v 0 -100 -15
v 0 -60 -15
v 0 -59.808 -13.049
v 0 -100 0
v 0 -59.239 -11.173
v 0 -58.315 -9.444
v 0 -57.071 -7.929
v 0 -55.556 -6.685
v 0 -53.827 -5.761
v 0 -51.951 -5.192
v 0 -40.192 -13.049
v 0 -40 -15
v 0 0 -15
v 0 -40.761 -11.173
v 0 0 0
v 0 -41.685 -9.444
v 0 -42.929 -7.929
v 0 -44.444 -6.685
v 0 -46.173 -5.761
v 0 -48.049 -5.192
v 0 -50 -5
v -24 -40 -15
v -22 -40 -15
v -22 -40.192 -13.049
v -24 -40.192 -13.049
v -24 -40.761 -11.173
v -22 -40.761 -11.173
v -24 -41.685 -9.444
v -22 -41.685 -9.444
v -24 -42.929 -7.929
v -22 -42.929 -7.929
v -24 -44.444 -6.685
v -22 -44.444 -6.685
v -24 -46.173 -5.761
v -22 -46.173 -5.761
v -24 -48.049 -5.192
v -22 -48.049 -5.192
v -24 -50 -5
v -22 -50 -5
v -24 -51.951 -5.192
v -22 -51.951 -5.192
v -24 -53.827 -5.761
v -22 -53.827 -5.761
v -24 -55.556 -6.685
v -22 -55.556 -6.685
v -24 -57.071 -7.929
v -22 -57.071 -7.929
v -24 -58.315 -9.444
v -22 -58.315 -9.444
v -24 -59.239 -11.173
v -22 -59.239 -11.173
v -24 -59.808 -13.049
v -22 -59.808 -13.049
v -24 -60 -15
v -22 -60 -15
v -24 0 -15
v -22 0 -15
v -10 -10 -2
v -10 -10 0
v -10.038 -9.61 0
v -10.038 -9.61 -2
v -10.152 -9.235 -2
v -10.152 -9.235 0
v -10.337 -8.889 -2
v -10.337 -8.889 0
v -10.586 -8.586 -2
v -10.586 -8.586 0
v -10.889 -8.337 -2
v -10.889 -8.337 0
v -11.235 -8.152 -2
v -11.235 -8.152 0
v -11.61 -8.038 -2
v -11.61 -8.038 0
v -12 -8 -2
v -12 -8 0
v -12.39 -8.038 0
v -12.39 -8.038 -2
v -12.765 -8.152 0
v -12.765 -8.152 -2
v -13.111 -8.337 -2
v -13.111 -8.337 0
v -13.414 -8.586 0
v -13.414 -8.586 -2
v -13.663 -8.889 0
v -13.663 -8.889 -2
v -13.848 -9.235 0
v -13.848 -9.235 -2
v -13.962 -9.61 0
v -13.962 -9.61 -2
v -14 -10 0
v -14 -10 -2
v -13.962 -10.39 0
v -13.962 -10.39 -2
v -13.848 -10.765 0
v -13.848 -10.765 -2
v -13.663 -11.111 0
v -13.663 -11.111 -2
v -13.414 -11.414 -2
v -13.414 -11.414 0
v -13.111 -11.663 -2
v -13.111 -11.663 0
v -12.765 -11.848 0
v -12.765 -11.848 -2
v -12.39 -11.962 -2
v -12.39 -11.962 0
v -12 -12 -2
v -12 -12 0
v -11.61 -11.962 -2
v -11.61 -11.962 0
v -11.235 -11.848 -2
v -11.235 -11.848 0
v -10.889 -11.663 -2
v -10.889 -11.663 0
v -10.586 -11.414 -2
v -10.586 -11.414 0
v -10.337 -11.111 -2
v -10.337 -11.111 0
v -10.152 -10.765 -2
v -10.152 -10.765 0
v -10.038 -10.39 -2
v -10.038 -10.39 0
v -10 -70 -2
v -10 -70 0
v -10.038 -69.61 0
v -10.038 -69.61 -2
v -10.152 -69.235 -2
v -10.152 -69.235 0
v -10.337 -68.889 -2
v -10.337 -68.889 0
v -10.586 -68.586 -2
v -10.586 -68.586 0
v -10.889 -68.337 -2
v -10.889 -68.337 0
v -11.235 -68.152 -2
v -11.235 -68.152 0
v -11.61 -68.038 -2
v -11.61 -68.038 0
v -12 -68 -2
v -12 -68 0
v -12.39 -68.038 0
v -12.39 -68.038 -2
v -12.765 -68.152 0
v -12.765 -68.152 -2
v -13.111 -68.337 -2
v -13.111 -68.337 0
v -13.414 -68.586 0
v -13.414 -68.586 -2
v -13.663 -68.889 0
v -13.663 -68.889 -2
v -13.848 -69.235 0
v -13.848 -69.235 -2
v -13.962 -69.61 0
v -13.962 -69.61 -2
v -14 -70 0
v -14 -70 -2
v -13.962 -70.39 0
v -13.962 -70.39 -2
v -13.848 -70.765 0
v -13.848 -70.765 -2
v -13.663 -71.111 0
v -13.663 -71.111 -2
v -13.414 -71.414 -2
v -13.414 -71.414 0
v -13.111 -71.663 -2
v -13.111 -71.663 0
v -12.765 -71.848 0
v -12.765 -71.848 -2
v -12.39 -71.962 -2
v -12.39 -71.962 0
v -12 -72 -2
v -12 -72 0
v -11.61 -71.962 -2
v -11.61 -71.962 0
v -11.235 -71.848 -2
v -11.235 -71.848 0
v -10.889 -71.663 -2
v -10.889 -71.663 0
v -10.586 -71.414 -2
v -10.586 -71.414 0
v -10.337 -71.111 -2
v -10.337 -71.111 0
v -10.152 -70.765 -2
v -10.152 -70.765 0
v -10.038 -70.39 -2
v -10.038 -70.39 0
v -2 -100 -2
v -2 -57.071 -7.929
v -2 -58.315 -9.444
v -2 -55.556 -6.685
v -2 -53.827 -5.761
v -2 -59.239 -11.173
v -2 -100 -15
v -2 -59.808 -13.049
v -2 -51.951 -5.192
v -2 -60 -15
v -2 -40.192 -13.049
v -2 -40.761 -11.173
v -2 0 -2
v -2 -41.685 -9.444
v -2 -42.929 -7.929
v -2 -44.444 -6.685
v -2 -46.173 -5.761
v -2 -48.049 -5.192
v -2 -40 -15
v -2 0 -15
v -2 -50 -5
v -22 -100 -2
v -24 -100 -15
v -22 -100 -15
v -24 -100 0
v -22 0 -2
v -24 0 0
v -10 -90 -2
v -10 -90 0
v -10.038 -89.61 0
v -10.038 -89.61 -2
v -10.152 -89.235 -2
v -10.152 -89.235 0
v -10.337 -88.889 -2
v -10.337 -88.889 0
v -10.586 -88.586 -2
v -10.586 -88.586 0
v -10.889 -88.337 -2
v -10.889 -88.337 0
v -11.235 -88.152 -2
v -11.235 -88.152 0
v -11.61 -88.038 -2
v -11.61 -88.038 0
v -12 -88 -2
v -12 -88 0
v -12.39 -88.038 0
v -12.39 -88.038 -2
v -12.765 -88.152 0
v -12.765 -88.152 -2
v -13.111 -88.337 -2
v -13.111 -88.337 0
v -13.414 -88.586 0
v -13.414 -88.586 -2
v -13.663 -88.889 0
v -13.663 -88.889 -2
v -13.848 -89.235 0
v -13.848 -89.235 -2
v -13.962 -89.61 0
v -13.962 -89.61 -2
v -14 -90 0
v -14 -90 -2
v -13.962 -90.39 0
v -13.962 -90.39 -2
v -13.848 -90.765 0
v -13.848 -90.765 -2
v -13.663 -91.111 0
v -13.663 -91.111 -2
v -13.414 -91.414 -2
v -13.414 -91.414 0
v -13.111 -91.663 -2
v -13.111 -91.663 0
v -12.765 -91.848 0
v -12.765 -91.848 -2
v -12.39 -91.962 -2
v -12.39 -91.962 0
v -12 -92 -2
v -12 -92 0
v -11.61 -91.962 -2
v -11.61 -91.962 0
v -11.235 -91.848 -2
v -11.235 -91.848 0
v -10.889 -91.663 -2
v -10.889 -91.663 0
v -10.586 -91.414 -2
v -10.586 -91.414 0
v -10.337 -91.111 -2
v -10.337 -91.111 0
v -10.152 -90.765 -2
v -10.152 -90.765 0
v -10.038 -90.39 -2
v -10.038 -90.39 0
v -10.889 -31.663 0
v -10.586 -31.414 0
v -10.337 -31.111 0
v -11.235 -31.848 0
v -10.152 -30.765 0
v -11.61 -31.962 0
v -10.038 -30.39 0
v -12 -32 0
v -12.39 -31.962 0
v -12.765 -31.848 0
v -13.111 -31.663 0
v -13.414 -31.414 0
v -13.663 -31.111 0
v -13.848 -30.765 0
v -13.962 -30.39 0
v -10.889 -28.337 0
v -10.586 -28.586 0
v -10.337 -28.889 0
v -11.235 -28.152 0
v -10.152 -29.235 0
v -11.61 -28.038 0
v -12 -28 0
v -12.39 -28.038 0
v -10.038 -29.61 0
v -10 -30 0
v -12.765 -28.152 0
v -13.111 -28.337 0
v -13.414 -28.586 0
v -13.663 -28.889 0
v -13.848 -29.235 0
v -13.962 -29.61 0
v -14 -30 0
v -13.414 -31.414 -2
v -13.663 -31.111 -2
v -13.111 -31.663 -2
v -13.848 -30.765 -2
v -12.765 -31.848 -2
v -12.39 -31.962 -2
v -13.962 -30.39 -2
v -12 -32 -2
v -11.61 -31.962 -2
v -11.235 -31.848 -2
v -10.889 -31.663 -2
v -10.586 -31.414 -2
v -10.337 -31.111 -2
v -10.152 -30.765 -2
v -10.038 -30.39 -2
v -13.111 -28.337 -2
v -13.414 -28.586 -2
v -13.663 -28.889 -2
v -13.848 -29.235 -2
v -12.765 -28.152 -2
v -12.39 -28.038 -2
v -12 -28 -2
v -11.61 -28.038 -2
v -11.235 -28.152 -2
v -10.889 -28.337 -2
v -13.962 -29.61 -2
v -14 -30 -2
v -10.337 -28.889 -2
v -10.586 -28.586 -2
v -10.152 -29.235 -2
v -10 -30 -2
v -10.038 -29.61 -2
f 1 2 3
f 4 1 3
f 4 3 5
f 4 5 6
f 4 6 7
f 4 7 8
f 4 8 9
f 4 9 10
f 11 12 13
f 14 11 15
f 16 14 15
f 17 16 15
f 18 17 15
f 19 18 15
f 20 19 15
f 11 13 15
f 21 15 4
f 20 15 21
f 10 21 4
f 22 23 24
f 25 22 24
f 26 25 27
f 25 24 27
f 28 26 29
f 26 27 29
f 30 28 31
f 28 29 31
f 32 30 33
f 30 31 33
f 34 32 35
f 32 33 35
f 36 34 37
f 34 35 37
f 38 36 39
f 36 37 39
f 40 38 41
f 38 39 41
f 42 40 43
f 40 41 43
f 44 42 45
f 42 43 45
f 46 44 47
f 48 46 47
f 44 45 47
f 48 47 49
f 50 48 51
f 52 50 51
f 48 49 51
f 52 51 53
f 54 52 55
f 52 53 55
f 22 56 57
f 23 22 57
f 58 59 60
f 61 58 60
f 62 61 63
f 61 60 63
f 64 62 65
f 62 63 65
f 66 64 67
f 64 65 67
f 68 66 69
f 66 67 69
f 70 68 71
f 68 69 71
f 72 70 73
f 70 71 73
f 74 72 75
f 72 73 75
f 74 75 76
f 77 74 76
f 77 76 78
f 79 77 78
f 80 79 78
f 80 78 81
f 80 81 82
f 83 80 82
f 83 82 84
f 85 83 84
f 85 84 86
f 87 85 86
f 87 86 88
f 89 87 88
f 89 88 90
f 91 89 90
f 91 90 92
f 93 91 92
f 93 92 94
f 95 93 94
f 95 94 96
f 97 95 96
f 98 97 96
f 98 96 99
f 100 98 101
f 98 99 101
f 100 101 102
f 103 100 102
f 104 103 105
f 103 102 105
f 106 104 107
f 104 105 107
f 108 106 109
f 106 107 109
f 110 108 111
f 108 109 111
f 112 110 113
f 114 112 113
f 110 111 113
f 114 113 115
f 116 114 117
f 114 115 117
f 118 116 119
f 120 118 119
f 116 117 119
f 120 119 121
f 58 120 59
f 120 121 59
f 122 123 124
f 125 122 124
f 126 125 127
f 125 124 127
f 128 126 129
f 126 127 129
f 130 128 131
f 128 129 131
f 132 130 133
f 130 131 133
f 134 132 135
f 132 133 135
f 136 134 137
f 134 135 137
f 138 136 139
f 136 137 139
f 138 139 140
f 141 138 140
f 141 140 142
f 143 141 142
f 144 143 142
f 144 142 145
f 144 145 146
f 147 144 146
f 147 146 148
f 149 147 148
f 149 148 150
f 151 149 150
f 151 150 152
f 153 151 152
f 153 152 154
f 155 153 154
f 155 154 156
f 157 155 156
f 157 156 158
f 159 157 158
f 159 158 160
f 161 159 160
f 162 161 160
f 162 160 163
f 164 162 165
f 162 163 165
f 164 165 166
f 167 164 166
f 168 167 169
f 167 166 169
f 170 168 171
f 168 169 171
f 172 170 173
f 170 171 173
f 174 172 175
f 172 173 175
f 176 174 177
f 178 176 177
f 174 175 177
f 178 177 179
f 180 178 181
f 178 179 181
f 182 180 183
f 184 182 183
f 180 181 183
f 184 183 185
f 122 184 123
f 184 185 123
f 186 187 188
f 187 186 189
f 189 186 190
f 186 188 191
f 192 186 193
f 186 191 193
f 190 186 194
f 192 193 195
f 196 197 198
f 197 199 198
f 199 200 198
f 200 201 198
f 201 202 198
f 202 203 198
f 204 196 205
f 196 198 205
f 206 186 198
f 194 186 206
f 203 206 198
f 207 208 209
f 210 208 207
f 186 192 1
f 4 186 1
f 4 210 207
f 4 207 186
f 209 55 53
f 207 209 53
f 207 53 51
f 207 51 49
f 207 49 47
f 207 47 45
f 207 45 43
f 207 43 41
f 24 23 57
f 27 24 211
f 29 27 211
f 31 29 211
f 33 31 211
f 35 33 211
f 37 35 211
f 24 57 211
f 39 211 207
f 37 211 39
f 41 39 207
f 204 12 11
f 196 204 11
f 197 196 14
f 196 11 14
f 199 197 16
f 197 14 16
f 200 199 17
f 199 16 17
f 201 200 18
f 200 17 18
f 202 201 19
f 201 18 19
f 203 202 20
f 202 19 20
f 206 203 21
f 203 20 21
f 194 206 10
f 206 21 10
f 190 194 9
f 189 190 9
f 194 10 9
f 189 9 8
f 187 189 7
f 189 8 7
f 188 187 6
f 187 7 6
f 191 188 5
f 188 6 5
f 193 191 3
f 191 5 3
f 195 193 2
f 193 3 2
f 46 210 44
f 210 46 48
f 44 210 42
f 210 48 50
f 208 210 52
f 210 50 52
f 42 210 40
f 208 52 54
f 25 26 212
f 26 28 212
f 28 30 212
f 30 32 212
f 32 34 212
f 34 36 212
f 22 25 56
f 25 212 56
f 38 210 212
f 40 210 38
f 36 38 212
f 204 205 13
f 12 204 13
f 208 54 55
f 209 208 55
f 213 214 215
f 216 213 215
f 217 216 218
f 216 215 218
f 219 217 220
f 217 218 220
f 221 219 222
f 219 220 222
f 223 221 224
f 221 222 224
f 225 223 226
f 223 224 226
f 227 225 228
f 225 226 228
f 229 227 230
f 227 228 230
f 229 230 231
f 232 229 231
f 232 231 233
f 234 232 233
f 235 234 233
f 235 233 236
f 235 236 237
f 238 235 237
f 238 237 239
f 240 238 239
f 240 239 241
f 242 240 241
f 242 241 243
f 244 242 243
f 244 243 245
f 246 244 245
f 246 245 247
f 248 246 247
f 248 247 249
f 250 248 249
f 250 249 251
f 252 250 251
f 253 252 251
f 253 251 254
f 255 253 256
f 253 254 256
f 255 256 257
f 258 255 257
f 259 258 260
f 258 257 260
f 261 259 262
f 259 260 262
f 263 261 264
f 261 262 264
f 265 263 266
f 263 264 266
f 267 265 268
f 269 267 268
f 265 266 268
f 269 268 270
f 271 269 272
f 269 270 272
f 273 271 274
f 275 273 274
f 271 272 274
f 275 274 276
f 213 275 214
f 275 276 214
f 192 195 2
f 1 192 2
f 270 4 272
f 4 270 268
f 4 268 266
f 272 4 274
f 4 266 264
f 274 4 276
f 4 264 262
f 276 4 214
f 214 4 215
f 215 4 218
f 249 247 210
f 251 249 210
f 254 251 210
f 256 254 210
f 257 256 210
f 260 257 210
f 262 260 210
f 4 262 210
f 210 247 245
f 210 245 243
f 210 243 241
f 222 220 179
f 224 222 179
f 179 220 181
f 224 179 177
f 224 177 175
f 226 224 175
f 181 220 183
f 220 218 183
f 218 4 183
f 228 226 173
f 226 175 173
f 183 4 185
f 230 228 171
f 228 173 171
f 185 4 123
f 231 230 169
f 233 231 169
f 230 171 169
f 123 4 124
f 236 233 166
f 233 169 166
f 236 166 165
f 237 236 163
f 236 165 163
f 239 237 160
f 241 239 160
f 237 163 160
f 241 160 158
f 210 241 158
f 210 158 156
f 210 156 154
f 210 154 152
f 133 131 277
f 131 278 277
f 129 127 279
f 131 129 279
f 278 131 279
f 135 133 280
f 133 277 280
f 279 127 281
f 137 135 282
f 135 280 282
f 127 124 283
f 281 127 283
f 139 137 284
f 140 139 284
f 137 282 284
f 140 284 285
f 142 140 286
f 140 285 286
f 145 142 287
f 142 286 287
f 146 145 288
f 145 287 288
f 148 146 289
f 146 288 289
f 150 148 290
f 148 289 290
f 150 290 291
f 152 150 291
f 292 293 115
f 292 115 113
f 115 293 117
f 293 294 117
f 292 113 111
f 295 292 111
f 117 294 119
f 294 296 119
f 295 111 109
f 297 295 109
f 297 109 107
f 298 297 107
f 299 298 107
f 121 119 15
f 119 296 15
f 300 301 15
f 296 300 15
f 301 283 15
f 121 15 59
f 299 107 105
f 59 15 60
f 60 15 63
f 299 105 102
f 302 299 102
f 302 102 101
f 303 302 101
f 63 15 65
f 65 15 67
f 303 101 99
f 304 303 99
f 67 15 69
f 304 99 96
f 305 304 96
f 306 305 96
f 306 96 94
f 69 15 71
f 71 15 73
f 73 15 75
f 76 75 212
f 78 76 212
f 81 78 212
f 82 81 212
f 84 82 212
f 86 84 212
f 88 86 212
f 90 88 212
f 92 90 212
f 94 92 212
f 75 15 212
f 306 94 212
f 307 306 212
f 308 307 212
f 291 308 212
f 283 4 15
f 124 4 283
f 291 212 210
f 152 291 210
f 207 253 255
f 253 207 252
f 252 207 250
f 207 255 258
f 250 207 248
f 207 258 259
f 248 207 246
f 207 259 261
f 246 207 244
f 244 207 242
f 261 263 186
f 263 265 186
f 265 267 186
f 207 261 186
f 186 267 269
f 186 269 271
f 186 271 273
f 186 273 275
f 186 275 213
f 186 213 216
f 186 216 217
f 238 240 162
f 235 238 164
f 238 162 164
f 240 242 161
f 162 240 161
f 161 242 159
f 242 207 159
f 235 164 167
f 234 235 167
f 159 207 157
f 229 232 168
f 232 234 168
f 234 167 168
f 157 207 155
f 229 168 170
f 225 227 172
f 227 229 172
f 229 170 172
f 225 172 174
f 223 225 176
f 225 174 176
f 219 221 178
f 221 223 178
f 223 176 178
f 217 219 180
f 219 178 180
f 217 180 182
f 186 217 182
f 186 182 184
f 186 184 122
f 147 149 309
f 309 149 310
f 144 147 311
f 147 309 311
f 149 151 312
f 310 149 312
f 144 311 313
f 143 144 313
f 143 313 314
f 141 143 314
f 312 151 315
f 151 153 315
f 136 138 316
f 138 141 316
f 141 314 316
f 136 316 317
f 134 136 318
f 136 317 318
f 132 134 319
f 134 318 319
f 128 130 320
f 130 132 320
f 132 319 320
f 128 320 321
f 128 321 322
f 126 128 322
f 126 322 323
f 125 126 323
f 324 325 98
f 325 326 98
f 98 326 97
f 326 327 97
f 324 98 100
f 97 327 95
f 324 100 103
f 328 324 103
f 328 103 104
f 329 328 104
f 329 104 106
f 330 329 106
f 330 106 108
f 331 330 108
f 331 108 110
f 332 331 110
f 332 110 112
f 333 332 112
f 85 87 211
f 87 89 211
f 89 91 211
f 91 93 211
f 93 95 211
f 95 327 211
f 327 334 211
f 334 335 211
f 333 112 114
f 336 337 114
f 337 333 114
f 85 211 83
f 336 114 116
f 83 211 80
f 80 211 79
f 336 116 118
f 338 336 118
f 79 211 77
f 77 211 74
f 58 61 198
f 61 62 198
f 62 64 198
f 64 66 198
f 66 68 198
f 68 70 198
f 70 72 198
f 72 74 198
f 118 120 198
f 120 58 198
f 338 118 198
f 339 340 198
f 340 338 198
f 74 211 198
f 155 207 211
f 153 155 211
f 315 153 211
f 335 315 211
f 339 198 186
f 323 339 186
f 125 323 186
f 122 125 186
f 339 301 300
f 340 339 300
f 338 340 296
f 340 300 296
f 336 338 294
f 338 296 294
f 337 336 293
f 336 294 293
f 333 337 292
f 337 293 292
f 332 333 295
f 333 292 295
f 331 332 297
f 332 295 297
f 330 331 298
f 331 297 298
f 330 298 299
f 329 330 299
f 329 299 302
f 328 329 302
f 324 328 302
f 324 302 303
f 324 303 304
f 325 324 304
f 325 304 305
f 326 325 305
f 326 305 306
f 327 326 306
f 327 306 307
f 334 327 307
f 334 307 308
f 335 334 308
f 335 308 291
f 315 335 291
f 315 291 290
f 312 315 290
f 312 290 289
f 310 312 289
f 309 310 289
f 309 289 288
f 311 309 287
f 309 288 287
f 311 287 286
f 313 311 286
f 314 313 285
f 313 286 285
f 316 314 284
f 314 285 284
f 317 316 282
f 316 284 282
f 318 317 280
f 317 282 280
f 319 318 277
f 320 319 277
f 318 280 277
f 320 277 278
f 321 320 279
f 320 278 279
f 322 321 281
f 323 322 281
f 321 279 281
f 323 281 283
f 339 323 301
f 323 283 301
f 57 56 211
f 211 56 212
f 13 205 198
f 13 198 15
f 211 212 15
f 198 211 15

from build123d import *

# Parameters (mm, degrees)
F1_DEPTH = 100
F2_R     = 10
F3_DEPTH = 25
F4_R     = 2
F5_DEPTH = 25


with BuildPart() as f1:
    # F0 (on Front) → F1 (new body)
    with BuildSketch(Plane.XZ):
        Polygon((0, -15), (0, 0), (-24, 0), (-24, -15), (-22, -15), (-22, -2), (-2, -2), (-2, -15), align=None)
    extrude(amount=F1_DEPTH)

    # F2 (on face) → F3 (cut)
    with BuildSketch(Plane.YZ):
        with Locations((-50, -15)):
            Circle(F2_R)
    extrude(amount=-F3_DEPTH, mode=Mode.SUBTRACT)

    # F4 (on face) → F5 (cut)
    with BuildSketch(Plane.XY):
        with Locations((-12, -90)):
            Circle(F4_R)
        with Locations((-12, -70)):
            Circle(F4_R)
        with Locations((-12, -30)):
            Circle(F4_R)
        with Locations((-12, -10)):
            Circle(F4_R)
    extrude(amount=-F5_DEPTH, mode=Mode.SUBTRACT)


solid = f1.part
